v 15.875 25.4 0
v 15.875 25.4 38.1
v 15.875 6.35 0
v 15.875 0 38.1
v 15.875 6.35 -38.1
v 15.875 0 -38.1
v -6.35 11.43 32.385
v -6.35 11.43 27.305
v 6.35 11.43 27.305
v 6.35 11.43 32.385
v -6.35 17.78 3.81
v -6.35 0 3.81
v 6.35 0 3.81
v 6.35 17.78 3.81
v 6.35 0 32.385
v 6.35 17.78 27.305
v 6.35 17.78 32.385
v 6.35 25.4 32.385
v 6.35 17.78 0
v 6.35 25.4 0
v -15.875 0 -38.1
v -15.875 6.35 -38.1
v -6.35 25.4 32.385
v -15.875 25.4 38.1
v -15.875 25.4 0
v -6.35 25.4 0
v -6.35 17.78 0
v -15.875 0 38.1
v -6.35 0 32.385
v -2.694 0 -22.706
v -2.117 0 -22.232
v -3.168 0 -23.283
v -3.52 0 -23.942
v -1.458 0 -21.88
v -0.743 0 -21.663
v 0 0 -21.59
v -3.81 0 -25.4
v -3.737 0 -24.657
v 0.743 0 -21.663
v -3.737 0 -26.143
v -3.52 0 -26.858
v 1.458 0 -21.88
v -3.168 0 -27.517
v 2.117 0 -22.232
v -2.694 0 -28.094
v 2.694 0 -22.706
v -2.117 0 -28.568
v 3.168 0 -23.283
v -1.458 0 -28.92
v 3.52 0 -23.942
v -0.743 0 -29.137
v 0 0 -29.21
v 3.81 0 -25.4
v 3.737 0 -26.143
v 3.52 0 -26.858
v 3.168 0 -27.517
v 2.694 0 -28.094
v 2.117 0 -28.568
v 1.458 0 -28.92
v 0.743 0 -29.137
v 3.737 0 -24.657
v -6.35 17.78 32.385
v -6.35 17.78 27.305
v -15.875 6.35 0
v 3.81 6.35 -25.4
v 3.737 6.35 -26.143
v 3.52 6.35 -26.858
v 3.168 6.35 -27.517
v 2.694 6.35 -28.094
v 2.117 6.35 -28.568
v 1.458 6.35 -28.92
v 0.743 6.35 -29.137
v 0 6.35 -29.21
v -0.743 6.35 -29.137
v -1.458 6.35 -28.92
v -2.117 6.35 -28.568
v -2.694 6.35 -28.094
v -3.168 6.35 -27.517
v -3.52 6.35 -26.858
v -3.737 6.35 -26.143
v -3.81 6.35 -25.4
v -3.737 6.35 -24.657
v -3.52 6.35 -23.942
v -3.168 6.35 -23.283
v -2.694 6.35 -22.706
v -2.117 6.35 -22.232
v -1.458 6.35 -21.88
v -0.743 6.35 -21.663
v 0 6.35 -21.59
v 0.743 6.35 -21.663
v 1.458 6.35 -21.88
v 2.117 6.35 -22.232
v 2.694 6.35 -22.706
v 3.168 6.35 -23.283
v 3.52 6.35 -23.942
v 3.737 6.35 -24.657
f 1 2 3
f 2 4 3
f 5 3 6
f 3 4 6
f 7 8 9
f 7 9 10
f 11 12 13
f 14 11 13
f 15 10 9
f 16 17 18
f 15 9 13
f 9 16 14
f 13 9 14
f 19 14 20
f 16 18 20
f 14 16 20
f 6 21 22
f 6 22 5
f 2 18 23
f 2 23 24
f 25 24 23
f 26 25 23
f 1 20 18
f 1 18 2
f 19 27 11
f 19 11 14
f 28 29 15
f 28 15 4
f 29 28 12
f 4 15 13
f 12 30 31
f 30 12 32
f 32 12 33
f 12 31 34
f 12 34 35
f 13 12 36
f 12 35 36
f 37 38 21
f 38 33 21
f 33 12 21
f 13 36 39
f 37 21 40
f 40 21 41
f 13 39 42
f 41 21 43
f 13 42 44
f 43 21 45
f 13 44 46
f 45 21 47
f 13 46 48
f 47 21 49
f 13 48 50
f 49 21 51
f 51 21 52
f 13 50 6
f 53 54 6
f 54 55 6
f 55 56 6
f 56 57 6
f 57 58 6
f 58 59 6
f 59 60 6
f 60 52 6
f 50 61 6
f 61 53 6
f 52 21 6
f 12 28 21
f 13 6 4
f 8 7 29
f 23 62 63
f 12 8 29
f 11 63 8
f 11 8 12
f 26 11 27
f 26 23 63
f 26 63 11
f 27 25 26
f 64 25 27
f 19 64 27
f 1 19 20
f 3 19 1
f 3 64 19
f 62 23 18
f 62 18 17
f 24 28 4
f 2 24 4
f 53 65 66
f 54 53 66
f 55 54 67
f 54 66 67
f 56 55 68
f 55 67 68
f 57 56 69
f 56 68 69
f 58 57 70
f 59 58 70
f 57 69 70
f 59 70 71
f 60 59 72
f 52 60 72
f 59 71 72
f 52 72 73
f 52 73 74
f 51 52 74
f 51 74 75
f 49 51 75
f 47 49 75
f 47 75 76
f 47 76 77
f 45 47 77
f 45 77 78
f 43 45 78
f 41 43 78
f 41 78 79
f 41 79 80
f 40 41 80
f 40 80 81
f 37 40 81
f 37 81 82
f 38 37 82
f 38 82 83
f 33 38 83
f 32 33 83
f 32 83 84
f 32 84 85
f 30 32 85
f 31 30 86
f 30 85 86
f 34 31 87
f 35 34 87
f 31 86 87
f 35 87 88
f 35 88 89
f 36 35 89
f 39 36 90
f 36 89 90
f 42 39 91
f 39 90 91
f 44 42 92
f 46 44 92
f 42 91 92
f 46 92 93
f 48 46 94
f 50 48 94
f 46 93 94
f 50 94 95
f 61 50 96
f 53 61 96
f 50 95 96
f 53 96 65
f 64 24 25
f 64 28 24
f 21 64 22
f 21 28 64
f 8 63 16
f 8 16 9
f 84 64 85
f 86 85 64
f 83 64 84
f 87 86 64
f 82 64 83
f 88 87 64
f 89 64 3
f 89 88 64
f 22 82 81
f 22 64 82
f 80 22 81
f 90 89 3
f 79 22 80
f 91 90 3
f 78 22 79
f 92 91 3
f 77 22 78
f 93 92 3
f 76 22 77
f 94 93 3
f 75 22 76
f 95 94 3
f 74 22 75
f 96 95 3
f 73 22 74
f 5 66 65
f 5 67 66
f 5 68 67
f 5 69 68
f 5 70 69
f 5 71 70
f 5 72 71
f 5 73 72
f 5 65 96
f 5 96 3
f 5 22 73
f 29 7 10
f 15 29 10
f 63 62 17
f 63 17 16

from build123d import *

# Parameters (mm, degrees)
SKETCH1_W           = 31.75
SKETCH1_H           = 76.2
BOSS_EXTRUDE1_DEPTH = 6.35
SKETCH2_R           = 3.81
CUT_EXTRUDE1_DEPTH  = 7.35
SKETCH3_W           = 31.75
SKETCH3_H           = 38.1
BOSS_EXTRUDE2_DEPTH = 19.05
SKETCH4_W           = 12.7
SKETCH4_H           = 38.1
CUT_EXTRUDE2_DEPTH  = 19.05
SKETCH5_W           = 12.7
SKETCH5_H           = 28.575
CUT_EXTRUDE3_DEPTH  = 7.35
SKETCH6_W           = 12.7
SKETCH6_H           = 3.81
BOSS_EXTRUDE3_DEPTH = 11.43
BOSS_EXTRUDE4_REACH = 24.225


with BuildPart() as part:
    # Sketch1 → Boss-Extrude1 (new body)
    with BuildSketch(Plane(origin=(0, 0, 0), x_dir=(1, 0, 0), z_dir=(0, 1, 0))):
        Rectangle(SKETCH1_W, SKETCH1_H)
    extrude(amount=BOSS_EXTRUDE1_DEPTH)

    # Sketch2 → Cut-Extrude1 (cut, through all)
    with BuildSketch(Plane(origin=(0, 6.35, 0), x_dir=(1, 0, 0), z_dir=(0, 1, 0))):
        with Locations((0, 25.4)):
            Circle(SKETCH2_R)
    extrude(amount=-CUT_EXTRUDE1_DEPTH, mode=Mode.SUBTRACT)

    # Sketch3 → Boss-Extrude2 (add)
    with BuildSketch(Plane(origin=(0, 6.35, 0), x_dir=(1, 0, 0), z_dir=(0, 1, 0))):
        with Locations((0, -19.05)):
            Rectangle(SKETCH3_W, SKETCH3_H)
    extrude(amount=BOSS_EXTRUDE2_DEPTH)

    # Sketch4 → Cut-Extrude2 (cut)
    with BuildSketch(Plane(origin=(0, 25.4, 0), x_dir=(1, 0, 0), z_dir=(0, 1, 0))):
        with Locations((0, -19.05)):
            Rectangle(SKETCH4_W, SKETCH4_H)
    extrude(amount=-CUT_EXTRUDE2_DEPTH, mode=Mode.SUBTRACT)

    # Sketch5 → Cut-Extrude3 (cut, through all)
    with BuildSketch(Plane(origin=(0, 6.35, 0), x_dir=(1, 0, 0), z_dir=(0, 1, 0))):
        with Locations((0, -18.0975)):
            Rectangle(SKETCH5_W, SKETCH5_H)
    extrude(amount=-CUT_EXTRUDE3_DEPTH, mode=Mode.SUBTRACT)

    # Sketch6 → Boss-Extrude3 (add)
    with BuildSketch(Plane(origin=(0, 6.35, 0), x_dir=(1, 0, 0), z_dir=(0, 1, 0))):
        with Locations((0, -1.905)):
            Rectangle(SKETCH6_W, SKETCH6_H)
    extrude(amount=BOSS_EXTRUDE3_DEPTH)

    # Sketch7 → Boss-Extrude4 (add, up to next)
    with BuildSketch(Plane(origin=(-6.35, 0, 0), x_dir=(0, 0, -1), z_dir=(1, 0, 0)), mode=Mode.PRIVATE) as boss_extrude4_sk1:
        Polygon((-32.385, 17.78), (-27.305, 17.78), (-27.305, 11.43), (-32.385, 11.43), (-32.385, 6.35), (-38.1, 6.35), (-38.1, 25.4), (-32.385, 25.4), align=None)
    boss_extrude4_tool1 = extrude(boss_extrude4_sk1.sketch, amount=BOSS_EXTRUDE4_REACH, mode=Mode.PRIVATE) - part.part
    add(boss_extrude4_tool1.solids().sort_by_distance((-6.35, 15.584714, 34.008786))[0])


solid = part.part
